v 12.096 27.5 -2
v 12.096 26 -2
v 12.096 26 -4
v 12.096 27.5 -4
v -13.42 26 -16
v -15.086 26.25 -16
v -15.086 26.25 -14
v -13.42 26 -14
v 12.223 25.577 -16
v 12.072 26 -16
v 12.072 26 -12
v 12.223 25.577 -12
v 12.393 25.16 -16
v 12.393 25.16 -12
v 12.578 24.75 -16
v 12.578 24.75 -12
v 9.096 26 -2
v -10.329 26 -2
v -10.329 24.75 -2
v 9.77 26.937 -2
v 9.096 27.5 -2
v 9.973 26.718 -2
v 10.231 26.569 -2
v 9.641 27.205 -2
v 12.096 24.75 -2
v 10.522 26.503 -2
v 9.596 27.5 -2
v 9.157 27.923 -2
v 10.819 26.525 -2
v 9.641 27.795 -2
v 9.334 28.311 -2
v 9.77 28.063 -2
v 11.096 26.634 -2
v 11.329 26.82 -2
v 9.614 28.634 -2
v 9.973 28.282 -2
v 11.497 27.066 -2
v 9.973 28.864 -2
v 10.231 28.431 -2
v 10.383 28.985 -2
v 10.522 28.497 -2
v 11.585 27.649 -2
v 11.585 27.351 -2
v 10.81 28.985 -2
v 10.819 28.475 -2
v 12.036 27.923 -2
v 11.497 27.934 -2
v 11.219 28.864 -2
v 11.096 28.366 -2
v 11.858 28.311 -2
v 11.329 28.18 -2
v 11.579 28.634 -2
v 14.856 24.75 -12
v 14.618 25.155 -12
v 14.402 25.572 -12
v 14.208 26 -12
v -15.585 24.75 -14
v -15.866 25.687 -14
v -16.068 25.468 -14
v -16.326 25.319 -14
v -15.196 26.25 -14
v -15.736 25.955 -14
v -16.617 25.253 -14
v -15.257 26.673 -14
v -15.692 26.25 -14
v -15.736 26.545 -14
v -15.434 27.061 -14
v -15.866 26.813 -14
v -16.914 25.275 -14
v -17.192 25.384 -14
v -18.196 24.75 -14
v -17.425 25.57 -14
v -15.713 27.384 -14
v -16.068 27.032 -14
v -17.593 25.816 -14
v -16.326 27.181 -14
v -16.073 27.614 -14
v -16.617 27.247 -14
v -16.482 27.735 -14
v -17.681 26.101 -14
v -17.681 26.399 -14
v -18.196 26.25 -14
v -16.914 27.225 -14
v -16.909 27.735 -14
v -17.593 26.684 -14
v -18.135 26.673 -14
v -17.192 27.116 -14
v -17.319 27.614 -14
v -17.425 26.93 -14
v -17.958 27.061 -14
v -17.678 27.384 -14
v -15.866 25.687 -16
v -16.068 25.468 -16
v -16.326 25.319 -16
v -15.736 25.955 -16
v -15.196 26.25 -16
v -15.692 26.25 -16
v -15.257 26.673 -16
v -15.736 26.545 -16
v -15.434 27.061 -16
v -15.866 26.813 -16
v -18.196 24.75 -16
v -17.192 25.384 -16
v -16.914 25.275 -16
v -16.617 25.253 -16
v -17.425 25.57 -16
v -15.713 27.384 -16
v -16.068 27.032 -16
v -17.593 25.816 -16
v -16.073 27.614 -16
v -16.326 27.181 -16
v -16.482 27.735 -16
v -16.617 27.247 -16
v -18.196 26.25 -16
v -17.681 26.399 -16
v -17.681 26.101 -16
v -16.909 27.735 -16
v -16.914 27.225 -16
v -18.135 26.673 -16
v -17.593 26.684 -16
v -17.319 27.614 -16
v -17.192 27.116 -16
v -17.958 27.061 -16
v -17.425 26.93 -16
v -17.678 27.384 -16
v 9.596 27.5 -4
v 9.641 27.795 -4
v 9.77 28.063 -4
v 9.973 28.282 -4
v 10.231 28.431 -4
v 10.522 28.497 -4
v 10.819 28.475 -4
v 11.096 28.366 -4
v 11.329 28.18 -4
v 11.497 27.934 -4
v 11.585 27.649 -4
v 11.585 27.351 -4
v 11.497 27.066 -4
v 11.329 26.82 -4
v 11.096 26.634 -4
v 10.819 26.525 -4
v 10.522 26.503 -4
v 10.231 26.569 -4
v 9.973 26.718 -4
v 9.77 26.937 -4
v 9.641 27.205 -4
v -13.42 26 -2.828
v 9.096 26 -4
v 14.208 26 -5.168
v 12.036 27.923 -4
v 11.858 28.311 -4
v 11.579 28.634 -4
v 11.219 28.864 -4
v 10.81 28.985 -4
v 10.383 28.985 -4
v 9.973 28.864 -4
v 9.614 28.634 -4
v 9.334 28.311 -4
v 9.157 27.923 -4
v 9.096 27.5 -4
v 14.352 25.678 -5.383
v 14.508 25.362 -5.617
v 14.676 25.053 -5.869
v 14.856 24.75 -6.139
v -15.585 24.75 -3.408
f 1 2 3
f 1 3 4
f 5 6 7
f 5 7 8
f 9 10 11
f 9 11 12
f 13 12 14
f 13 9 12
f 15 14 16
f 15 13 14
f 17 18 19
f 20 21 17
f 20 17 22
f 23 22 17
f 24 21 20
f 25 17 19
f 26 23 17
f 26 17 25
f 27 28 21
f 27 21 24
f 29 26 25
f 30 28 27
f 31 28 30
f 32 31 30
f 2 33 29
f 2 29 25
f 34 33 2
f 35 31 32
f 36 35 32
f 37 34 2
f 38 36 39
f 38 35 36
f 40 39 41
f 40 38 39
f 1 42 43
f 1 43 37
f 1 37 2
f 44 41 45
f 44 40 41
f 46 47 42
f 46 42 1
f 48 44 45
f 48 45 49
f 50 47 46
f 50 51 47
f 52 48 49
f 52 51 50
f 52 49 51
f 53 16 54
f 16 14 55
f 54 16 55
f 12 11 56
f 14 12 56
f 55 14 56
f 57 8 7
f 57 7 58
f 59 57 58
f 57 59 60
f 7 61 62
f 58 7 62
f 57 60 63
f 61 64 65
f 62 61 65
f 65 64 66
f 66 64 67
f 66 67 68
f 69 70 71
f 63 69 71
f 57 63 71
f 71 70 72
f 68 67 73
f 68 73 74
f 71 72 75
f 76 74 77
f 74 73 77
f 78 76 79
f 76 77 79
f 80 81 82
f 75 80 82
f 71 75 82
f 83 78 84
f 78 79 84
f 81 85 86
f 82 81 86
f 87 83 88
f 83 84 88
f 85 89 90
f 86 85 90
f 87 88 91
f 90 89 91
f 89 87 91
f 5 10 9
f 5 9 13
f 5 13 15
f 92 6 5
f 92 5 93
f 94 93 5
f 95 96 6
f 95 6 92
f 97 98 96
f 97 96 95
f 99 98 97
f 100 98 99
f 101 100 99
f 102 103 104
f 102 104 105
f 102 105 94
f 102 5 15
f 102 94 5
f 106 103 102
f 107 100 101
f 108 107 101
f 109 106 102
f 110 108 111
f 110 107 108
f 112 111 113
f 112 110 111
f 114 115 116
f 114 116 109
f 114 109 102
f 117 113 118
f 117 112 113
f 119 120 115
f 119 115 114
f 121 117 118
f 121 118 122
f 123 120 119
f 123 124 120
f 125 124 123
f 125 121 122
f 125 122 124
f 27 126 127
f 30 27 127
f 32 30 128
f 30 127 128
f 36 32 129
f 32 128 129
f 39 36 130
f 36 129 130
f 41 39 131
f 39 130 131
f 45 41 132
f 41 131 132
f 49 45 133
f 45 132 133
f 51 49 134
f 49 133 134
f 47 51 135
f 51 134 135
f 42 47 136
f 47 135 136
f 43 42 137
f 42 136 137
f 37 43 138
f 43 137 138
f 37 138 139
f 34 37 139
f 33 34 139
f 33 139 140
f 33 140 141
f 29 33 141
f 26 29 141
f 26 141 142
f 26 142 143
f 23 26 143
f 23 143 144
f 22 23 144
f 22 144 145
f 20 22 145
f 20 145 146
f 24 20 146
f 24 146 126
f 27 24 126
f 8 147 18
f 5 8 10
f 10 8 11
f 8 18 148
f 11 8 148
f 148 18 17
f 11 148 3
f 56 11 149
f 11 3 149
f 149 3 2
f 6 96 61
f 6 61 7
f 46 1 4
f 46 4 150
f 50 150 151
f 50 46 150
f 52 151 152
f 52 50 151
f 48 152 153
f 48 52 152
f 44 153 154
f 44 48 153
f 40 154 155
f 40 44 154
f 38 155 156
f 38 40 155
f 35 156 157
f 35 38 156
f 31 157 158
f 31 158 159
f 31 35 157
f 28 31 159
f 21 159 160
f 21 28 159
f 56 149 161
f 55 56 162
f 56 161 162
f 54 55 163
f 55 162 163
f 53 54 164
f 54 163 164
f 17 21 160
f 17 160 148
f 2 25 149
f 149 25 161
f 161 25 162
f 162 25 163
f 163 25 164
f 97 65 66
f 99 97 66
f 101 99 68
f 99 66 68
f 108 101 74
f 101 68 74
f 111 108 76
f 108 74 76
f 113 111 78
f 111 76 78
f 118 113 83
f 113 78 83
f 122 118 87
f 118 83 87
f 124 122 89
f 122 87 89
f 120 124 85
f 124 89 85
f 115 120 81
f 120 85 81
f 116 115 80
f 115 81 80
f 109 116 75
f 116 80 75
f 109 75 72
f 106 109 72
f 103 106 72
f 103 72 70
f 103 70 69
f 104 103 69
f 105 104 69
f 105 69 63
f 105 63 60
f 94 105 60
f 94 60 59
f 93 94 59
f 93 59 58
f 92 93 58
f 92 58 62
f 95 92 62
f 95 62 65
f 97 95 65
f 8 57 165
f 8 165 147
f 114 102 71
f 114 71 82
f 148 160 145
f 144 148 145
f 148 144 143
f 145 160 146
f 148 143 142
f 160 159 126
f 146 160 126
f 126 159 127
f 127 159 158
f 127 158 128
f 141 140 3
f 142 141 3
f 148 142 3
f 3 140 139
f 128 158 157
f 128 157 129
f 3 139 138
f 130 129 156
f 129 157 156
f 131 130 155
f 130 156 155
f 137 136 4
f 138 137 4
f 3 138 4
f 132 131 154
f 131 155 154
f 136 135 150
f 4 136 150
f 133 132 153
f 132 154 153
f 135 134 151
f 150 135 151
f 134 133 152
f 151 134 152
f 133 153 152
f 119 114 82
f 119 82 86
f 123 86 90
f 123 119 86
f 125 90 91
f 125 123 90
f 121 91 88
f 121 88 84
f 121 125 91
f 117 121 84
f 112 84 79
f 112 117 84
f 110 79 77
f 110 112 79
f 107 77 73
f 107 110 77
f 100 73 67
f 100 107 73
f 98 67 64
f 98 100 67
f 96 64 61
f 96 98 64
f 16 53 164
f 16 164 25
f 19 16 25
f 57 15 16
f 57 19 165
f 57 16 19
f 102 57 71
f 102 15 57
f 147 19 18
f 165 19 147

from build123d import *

# Parameters (mm, degrees)
EXTRUDE_1_DEPTH     = 14
CUT_EXTRUDE_1_DEPTH = 4
CUT_EXTRUDE_2_DEPTH = 23.370796565
EXTRUDE_2_DEPTH     = 2
EXTRUDE_3_DEPTH     = 2
MM_1_D              = 2
MM_2_D              = 2


with BuildPart() as part:
    # 草图2 → 凸台-拉伸1 (new body)
    with BuildSketch(Plane(origin=(0, 0, -2), x_dir=(-1, 0, 0), z_dir=(0, 0, -1))):
        with BuildLine():
            Line((-14.855557574, 24.75), (15.584929867, 24.75))
            Line((15.584929867, 24.75), (13.419866357, 26))
            Line((13.419866357, 26), (-14.208438024, 26))
            ThreePointArc((-14.208438024, 26), (-14.507523283, 25.36232965), (-14.855557574, 24.75))
        make_face()
    extrude(amount=EXTRUDE_1_DEPTH)

    # 草图3 → 切除-拉伸1 (cut)
    with BuildSketch(Plane(origin=(0, 0, -16), x_dir=(-1, 0, 0), z_dir=(0, 0, -1))):
        with BuildLine():
            Line((-12.578432584, 24.75), (-17.35825905, 24.75))
            Line((-17.35825905, 24.75), (-16.062803405, 32.25))
            Line((-16.062803405, 32.25), (-11.849295798, 32.25))
            ThreePointArc((-11.849295798, 32.25), (-11.55161702, 28.435617497), (-12.578432584, 24.75))
        make_face()
    extrude(amount=-CUT_EXTRUDE_1_DEPTH, mode=Mode.SUBTRACT)

    # 草图4 → 切除-拉伸2 (cut, through all)
    with BuildSketch(Plane.XZ.offset(-24.75)):
        Polygon((12.09629915, -2), (15.429632483, -7), (15.429632483, -2), align=None)
        Polygon((-10.329335075, -2), (-15.584929867, -3.40823238), (-15.584929867, -2), align=None)
    extrude(amount=-CUT_EXTRUDE_2_DEPTH, mode=Mode.SUBTRACT)

    # 草图6 → 凸台-拉伸2 (add)
    with BuildSketch(Plane(origin=(0, 0, -16), x_dir=(-1, 0, 0), z_dir=(0, 0, -1))):
        with BuildLine():
            Line((13.419866357, 26), (15.584929867, 24.75))
            Line((15.584929867, 24.75), (16.695744446, 24.75))
            ThreePointArc((16.695744446, 24.75), (15.635084274, 25.189339828), (15.195744446, 26.25))
            Line((15.195744446, 26.25), (15.085744446, 26.25))
            Line((15.085744446, 26.25), (13.419866357, 26))
        make_face()
        with BuildLine():
            ThreePointArc((15.195744446, 26.25), (15.635084274, 25.189339828), (16.695744446, 24.75))
            ThreePointArc((16.695744446, 24.75), (17.756404617, 25.189339828), (18.195744446, 26.25))
            Line((18.195744446, 26.25), (15.195744446, 26.25))
        make_face()
        with BuildLine():
            ThreePointArc((18.195744446, 26.25), (16.695744446, 27.75), (15.195744446, 26.25))
            Line((15.195744446, 26.25), (18.195744446, 26.25))
        make_face()
        with BuildLine():
            ThreePointArc((18.195744446, 26.25), (17.756404617, 25.189339828), (16.695744446, 24.75))
            Line((16.695744446, 24.75), (18.195744446, 24.75))
            Line((18.195744446, 24.75), (18.195744446, 26.25))
        make_face()
    extrude(amount=-EXTRUDE_2_DEPTH)

    # 草图7 → 凸台-拉伸3 (add)
    with BuildSketch(Plane.XY.offset(-2)):
        with BuildLine():
            Line((10.59629915, 26), (12.09629915, 26))
            Line((12.09629915, 26), (12.09629915, 27.5))
            ThreePointArc((12.09629915, 27.5), (11.656959321, 26.439339828), (10.59629915, 26))
        make_face()
        with BuildLine():
            Line((9.09629915, 26), (10.59629915, 26))
            ThreePointArc((10.59629915, 26), (9.535638978, 26.439339828), (9.09629915, 27.5))
            Line((9.09629915, 27.5), (9.09629915, 26))
        make_face()
        with BuildLine():
            ThreePointArc((10.59629915, 26), (11.656959321, 26.439339828), (12.09629915, 27.5))
            Line((12.09629915, 27.5), (9.09629915, 27.5))
            ThreePointArc((9.09629915, 27.5), (9.535638978, 26.439339828), (10.59629915, 26))
        make_face()
        with BuildLine():
            Line((9.09629915, 27.5), (12.09629915, 27.5))
            ThreePointArc((12.09629915, 27.5), (10.59629915, 29), (9.09629915, 27.5))
        make_face()
    extrude(amount=-EXTRUDE_3_DEPTH)

    # 大小mm 暗销孔1 (through all)
    with Locations(Plane(origin=(0, 0, -16), x_dir=(-1, 0, 0), z_dir=(0, 0, -1))):
        with Locations((16.691791053, 26.25)):
            Hole(MM_1_D / 2)

    # 大小mm 暗销孔2 (through all)
    with Locations(Plane.XY.offset(-2)):
        with Locations((10.59629915, 27.5)):
            Hole(MM_2_D / 2)


solid = part.part
